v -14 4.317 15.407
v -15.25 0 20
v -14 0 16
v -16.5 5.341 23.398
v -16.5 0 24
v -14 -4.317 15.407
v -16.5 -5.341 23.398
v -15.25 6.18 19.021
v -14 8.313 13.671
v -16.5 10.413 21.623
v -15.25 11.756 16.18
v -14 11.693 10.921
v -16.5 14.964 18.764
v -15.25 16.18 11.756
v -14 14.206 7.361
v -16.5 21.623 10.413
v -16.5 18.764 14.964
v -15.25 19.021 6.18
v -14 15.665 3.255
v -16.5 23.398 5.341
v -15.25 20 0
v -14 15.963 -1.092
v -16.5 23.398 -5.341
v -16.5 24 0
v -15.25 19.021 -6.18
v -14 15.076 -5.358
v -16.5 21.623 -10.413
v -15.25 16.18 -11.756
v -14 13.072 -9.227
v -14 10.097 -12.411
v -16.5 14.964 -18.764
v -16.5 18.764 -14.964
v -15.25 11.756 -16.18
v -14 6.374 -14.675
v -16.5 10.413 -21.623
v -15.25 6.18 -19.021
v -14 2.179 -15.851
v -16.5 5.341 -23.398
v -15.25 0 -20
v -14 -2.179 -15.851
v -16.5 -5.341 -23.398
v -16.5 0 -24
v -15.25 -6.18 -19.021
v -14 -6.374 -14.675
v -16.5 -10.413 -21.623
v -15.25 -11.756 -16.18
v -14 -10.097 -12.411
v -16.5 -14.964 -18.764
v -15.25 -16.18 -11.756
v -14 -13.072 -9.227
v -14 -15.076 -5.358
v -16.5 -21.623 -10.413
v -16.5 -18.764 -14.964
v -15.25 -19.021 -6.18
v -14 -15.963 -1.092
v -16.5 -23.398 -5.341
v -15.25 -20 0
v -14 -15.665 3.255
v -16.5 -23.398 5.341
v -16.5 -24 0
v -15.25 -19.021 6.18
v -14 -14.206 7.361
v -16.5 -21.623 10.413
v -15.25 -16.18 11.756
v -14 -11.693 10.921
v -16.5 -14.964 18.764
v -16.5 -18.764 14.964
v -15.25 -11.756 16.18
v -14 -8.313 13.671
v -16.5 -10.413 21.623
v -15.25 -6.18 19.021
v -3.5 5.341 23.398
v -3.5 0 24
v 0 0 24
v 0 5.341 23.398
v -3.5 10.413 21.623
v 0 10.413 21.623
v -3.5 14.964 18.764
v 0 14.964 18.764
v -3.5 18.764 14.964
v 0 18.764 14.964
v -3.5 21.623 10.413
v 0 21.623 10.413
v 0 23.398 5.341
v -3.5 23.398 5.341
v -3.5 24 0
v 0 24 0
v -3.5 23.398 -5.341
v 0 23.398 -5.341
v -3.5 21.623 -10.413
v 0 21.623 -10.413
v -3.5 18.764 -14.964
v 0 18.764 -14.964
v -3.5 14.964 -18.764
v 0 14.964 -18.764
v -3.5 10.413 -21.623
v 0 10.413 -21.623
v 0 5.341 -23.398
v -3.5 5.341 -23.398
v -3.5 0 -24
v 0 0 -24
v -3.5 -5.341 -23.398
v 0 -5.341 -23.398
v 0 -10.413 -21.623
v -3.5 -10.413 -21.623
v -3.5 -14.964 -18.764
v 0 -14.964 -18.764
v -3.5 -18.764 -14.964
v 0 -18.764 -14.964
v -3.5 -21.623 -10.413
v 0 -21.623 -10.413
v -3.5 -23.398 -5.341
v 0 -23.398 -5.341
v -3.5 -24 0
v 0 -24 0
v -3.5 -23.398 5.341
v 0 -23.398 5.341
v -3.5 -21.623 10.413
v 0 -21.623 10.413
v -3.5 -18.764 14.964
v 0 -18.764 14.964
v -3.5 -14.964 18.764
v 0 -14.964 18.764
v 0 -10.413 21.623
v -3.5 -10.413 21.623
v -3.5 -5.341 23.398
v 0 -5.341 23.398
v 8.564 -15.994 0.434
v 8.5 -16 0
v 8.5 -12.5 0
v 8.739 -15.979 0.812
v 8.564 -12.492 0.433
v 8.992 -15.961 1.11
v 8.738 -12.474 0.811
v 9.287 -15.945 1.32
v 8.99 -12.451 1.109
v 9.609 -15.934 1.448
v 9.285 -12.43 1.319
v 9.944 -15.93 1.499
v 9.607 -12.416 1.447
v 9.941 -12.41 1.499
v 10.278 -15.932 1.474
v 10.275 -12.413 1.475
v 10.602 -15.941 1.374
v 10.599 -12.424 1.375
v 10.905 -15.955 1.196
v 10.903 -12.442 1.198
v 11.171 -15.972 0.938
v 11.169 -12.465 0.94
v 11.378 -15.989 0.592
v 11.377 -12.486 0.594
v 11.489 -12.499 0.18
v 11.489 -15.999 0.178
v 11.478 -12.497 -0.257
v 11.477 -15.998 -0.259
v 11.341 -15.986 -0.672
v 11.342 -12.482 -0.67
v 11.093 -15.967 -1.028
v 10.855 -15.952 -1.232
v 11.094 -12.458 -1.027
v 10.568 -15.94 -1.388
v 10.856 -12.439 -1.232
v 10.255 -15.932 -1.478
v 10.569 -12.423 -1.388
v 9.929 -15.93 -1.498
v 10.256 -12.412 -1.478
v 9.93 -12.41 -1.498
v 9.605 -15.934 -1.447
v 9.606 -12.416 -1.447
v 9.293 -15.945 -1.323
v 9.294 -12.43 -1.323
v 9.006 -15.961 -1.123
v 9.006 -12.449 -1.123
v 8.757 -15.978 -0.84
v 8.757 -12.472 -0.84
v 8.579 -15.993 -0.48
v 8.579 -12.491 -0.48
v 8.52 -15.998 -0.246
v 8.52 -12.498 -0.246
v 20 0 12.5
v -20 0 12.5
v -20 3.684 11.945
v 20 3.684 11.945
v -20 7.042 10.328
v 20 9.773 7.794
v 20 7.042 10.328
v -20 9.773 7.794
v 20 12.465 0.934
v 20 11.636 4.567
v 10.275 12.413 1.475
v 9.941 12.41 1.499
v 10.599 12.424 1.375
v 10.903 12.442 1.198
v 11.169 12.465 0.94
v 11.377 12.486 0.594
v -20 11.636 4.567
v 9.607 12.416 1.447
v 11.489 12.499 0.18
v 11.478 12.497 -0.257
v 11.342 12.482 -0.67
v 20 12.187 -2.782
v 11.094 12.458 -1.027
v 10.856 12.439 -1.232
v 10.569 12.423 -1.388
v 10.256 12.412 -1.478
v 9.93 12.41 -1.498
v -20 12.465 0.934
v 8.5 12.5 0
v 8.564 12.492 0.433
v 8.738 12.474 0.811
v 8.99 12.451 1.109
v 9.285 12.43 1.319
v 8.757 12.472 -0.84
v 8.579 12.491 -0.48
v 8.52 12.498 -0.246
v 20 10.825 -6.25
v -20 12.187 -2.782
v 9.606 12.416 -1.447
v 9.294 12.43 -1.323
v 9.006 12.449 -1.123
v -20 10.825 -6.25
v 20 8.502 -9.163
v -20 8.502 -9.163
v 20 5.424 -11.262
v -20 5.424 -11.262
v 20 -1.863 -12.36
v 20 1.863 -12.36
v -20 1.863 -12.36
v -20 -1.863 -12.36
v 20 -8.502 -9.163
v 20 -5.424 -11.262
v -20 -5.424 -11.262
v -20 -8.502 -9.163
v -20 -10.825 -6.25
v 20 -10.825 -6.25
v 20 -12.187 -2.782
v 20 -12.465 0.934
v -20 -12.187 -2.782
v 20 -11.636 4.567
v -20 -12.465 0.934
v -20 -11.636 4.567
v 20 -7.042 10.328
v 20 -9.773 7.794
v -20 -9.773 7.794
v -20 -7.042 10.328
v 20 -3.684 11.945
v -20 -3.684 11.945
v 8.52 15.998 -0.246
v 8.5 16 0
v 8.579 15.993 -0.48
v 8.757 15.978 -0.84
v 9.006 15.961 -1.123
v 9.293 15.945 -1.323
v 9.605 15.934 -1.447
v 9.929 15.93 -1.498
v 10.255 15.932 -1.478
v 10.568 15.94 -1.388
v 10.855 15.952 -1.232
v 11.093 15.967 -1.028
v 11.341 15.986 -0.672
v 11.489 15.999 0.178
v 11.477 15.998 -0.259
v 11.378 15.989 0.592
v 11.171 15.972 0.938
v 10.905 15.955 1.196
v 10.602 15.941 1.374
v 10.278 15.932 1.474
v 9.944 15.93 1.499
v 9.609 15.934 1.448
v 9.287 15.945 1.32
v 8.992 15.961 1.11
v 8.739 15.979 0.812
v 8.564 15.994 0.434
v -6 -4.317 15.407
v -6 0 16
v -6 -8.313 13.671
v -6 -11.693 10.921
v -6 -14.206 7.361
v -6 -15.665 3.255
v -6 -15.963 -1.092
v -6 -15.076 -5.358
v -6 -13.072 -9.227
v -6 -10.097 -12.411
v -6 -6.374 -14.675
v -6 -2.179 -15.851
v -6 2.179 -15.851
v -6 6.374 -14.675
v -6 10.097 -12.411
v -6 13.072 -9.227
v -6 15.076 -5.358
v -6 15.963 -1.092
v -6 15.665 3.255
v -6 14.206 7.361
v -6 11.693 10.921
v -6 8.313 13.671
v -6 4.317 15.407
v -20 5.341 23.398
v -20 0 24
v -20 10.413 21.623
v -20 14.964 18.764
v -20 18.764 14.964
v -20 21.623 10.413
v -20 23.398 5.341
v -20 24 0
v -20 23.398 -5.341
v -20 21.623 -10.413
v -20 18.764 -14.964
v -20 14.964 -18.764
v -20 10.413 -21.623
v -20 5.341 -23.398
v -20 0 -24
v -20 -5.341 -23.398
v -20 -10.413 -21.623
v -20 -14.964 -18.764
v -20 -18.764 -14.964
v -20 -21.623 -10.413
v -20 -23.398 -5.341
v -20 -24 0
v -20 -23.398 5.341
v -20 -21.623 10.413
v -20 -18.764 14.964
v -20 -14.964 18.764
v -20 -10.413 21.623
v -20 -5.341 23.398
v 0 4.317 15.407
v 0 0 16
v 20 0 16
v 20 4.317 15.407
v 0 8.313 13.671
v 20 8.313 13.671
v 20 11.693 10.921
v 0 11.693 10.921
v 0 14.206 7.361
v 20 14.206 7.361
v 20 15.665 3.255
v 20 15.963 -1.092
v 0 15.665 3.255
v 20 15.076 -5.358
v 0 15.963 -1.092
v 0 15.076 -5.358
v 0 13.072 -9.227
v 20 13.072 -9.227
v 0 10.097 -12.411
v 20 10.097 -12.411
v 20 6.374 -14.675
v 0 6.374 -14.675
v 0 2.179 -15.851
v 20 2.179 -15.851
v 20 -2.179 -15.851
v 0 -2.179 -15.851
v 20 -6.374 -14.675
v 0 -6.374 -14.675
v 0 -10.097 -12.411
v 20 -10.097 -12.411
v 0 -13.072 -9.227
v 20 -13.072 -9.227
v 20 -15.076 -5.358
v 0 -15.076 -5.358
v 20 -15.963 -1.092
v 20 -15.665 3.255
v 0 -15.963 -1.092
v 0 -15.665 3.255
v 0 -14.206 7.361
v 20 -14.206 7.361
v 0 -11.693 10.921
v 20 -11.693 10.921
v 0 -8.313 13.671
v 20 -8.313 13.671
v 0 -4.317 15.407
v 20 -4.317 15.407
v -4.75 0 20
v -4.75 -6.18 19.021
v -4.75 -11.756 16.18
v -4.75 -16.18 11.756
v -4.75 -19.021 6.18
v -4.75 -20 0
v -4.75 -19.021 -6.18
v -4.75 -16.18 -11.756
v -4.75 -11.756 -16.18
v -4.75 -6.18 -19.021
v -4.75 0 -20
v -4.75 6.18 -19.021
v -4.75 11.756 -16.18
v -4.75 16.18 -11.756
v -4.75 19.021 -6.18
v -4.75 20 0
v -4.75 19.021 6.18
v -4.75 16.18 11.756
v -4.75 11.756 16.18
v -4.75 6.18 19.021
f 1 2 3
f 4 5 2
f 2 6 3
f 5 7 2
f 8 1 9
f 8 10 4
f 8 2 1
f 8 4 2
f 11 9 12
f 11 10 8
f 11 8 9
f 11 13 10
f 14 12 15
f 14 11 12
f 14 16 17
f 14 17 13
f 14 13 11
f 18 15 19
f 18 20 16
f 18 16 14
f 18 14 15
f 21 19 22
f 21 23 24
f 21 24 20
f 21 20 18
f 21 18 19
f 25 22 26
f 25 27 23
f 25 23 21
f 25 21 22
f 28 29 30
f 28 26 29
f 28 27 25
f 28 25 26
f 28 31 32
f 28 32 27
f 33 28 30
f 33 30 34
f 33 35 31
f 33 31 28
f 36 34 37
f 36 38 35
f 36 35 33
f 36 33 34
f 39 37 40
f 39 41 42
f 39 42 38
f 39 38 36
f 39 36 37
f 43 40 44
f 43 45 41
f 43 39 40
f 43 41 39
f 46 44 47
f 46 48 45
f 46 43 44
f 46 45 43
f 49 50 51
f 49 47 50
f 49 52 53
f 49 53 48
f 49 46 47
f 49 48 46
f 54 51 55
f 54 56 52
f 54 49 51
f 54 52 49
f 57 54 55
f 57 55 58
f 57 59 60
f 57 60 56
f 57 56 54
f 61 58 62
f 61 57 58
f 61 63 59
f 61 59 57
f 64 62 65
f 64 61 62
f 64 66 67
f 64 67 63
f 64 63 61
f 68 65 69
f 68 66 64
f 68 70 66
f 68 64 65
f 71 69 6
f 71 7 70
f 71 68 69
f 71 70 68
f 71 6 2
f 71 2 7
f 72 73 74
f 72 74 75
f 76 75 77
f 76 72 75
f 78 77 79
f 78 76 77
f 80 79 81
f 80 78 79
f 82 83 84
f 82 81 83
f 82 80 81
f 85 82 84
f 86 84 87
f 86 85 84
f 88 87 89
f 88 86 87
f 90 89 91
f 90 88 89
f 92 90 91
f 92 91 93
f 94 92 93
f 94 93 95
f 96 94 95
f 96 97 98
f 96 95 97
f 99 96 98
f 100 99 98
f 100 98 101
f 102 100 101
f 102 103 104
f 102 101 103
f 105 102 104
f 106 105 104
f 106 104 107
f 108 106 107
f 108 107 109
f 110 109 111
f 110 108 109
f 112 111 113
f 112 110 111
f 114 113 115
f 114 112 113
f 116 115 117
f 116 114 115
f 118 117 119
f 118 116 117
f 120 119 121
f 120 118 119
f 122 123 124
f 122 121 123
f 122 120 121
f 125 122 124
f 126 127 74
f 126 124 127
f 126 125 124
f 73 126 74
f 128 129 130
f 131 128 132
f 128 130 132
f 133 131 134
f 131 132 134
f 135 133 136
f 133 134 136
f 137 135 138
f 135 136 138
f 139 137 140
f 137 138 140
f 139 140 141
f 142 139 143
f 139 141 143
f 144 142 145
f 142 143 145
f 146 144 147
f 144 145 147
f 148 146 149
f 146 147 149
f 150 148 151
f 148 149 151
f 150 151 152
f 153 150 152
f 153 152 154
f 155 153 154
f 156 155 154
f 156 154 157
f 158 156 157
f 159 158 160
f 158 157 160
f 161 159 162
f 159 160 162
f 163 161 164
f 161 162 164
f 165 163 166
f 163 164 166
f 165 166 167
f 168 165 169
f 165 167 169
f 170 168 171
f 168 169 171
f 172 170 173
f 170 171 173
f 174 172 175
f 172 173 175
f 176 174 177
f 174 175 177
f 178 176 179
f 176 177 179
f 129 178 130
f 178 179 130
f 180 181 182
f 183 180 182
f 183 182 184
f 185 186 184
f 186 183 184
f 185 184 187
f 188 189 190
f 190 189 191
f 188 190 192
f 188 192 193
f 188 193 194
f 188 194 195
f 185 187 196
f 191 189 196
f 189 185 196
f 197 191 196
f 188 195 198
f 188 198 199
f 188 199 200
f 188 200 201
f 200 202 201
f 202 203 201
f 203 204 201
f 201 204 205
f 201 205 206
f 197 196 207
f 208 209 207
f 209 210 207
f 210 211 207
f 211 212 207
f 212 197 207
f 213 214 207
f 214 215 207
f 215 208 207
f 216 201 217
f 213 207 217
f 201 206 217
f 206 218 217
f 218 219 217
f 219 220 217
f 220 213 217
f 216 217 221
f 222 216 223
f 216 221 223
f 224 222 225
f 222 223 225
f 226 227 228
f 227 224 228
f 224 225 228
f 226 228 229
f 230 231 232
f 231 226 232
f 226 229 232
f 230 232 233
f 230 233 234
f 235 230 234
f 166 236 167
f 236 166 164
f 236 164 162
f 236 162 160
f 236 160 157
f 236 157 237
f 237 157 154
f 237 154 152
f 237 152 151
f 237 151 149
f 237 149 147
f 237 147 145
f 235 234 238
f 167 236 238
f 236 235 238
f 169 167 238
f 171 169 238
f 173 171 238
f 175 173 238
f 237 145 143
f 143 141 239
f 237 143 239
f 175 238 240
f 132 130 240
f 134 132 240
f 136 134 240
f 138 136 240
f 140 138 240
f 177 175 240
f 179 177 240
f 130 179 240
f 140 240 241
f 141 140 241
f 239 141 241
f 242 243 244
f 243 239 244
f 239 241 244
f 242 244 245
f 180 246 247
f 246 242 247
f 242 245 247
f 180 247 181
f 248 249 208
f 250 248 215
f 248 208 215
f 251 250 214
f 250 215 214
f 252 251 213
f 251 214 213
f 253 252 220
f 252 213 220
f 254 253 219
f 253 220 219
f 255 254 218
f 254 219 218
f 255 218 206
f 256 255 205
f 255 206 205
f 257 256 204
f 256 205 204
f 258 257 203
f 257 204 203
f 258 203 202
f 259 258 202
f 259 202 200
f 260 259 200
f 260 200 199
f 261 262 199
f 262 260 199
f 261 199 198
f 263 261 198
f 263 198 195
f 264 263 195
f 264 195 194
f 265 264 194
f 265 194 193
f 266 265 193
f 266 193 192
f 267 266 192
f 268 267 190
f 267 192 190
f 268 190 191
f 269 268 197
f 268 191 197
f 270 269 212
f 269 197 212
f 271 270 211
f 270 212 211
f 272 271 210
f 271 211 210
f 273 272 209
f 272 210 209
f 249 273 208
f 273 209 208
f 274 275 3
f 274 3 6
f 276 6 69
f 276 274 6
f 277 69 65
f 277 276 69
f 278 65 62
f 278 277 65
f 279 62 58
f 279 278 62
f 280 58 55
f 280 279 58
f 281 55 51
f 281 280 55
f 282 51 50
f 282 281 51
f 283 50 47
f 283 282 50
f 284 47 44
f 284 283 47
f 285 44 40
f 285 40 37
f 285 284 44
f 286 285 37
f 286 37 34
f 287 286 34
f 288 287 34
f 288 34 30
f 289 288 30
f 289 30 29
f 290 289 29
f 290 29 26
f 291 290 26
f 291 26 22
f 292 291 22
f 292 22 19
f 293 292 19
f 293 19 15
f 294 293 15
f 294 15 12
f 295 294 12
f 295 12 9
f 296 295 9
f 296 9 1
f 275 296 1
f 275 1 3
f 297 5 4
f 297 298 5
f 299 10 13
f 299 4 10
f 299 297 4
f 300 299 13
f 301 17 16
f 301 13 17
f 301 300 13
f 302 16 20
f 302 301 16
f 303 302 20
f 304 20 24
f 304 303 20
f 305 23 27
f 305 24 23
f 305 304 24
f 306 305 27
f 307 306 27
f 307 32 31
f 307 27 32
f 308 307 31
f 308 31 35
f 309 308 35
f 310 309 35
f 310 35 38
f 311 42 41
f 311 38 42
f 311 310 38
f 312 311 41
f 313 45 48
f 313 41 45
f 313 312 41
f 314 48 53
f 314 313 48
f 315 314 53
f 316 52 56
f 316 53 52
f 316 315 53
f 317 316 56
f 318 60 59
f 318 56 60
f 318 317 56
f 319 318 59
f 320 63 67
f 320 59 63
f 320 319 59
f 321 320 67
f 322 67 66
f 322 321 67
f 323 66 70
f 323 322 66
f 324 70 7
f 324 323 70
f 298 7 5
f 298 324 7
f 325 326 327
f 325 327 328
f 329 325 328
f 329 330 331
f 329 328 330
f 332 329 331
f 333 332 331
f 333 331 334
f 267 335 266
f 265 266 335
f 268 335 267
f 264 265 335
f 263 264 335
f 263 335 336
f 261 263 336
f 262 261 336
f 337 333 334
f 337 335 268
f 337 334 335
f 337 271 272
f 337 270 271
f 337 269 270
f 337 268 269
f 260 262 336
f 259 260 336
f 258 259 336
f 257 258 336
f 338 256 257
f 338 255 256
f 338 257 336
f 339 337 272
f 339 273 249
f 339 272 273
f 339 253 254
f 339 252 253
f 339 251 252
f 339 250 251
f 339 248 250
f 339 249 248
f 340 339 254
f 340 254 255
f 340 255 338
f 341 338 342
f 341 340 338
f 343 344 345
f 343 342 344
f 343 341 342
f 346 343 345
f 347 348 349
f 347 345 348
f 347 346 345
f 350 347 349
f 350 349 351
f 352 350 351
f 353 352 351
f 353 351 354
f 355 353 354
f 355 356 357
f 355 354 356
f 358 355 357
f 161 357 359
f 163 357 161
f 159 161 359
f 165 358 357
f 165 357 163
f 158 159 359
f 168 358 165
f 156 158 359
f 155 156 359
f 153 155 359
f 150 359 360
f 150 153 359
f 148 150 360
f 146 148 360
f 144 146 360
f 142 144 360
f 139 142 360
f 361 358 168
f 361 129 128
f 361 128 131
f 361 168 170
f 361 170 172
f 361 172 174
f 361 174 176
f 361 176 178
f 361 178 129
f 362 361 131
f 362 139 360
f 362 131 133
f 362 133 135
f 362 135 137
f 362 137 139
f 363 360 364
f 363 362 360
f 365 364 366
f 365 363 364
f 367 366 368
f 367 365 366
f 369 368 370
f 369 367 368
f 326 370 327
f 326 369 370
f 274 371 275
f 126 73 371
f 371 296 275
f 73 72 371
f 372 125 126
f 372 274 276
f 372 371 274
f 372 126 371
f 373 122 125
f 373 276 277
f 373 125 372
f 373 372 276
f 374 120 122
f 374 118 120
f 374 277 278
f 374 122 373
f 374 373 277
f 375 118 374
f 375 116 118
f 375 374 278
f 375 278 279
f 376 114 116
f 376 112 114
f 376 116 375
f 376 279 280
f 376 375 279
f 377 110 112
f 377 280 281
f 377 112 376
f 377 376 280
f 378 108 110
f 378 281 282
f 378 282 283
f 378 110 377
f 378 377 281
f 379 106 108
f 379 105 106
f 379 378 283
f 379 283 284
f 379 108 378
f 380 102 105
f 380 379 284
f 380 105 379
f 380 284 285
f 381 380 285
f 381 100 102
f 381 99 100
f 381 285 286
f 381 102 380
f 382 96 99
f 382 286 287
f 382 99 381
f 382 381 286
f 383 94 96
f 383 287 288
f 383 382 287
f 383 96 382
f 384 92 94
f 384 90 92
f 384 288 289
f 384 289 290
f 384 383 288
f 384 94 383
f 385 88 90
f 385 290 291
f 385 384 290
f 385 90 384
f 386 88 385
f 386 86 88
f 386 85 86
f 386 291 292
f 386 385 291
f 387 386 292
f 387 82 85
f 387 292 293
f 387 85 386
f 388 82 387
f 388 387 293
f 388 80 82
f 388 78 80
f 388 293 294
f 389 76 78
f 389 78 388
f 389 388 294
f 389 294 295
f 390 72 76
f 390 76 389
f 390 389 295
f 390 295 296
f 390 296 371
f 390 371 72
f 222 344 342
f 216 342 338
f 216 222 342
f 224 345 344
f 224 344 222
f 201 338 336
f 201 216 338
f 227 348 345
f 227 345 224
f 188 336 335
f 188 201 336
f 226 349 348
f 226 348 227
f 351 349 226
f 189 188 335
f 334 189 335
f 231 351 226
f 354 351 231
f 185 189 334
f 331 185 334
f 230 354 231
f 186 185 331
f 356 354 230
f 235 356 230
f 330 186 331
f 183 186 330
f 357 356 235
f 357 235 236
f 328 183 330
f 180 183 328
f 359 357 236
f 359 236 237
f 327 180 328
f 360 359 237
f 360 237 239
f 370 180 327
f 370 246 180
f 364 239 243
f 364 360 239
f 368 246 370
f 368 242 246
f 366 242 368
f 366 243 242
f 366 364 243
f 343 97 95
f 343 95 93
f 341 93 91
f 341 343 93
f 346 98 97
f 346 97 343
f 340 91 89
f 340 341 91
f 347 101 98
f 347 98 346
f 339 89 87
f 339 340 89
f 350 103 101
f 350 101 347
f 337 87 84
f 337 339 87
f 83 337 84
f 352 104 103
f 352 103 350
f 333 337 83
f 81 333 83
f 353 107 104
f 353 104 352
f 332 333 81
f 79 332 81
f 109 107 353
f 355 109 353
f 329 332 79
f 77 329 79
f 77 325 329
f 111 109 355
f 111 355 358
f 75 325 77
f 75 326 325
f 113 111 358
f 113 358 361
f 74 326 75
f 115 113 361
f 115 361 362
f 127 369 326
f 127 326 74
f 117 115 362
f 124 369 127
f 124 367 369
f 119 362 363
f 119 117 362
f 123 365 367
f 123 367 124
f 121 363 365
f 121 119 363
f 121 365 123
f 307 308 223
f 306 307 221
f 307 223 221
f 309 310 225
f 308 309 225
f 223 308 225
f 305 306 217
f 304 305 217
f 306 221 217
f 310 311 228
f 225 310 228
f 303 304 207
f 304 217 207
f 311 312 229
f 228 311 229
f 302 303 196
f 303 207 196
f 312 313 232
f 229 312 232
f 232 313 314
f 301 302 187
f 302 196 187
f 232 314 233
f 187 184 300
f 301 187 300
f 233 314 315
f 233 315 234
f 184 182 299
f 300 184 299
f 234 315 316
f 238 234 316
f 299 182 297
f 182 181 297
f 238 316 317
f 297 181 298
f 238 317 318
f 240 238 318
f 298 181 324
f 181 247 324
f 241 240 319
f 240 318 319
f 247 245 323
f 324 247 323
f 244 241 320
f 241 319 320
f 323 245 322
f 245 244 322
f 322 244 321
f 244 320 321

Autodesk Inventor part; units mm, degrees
ref_plane "YZ Plane" through (0, 0, 0) normal (1, 0, 0) x (0, 1, 0)
ref_plane "XZ Plane" through (0, 0, 0) normal (0, 1, 0) x (-1, 0, 0)
ref_plane "XY Plane" through (0, 0, 0) normal (0, 0, 1) x (1, 0, 0)
sketch "Эскиз1" plane through (0, 0, 0) normal (0, 1, 0) x (-1, 0, 0)
  line L0 (0, 24) -> (20, 24)
  line L1 (20, 24) -> (20, 0)
  line L2 (20, 0) -> (0, 0)
  line L3 (20, 24) -> (14, 24)
  line L4 (14, 16) -> (6, 16)
  line L5 (20, 0) -> (-20, 0)
  line L6 (-20, 0) -> (-20, 16)
  line L7 (-20, 16) -> (0, 16)
  line L8 (-20, 0) -> (-20, 12.5)
  line L9 (0, 16) -> (0, 24)
  line L10 (10, 24) -> (3.5, 24)
  line L11 (3.5, 24) -> (6, 16)
  line L12 (3.5, 24) -> (16.5, 24)
  line L13 (16.5, 24) -> (14, 16)
  line L14 (20, 0) -> (20, 16.5)
  line L15 (0, 0) -> (5, 0)
  line L16 (0, 16) -> (5, 16)
  line L17 (-20, 12.5) -> (5, 12.5)
  line L18 (5, 12.5) -> (20, 12.5)
  point P0 (16.5, 24)
  point P1 (20, 20.5)
  dimension "d0" = 24
  dimension "d1" = 20
  dimension "d3" = 8
  dimension "d5" = 40
  dimension "d6" = 16
  dimension "d7" = 12.5
  dimension "d15" = 6.5
  dimension "d16" = 13
revolve "Вращение4" add sketch "Эскиз1" angle 360 about axis through (-20, 0, 0) along (1, 0, 0) contours L0 L11 L4 L13 L1 L18 L17 L6 L7 L9
sketch "Эскиз4" plane through (0, 0, 0) normal (0, 1, 0) x (-1, 0, 0)
  line L0 (-20, 16) -> (-20, -16) projected
  line L1 (-20, 0) -> (0, 0)
  line L2 (0, 0) -> (-10, 0)
  circle A0 centre (-10, 0) radius 1.5
  dimension "d43" = 3
extrude "Выдавливание5" cut sketch "Эскиз4" along normal mid plane 59.25
thread "Резьба4" size "M3x0.5" class "6H" standard "ANSI Metric M Profile" full length
properties part number "17701729.303661.004"
